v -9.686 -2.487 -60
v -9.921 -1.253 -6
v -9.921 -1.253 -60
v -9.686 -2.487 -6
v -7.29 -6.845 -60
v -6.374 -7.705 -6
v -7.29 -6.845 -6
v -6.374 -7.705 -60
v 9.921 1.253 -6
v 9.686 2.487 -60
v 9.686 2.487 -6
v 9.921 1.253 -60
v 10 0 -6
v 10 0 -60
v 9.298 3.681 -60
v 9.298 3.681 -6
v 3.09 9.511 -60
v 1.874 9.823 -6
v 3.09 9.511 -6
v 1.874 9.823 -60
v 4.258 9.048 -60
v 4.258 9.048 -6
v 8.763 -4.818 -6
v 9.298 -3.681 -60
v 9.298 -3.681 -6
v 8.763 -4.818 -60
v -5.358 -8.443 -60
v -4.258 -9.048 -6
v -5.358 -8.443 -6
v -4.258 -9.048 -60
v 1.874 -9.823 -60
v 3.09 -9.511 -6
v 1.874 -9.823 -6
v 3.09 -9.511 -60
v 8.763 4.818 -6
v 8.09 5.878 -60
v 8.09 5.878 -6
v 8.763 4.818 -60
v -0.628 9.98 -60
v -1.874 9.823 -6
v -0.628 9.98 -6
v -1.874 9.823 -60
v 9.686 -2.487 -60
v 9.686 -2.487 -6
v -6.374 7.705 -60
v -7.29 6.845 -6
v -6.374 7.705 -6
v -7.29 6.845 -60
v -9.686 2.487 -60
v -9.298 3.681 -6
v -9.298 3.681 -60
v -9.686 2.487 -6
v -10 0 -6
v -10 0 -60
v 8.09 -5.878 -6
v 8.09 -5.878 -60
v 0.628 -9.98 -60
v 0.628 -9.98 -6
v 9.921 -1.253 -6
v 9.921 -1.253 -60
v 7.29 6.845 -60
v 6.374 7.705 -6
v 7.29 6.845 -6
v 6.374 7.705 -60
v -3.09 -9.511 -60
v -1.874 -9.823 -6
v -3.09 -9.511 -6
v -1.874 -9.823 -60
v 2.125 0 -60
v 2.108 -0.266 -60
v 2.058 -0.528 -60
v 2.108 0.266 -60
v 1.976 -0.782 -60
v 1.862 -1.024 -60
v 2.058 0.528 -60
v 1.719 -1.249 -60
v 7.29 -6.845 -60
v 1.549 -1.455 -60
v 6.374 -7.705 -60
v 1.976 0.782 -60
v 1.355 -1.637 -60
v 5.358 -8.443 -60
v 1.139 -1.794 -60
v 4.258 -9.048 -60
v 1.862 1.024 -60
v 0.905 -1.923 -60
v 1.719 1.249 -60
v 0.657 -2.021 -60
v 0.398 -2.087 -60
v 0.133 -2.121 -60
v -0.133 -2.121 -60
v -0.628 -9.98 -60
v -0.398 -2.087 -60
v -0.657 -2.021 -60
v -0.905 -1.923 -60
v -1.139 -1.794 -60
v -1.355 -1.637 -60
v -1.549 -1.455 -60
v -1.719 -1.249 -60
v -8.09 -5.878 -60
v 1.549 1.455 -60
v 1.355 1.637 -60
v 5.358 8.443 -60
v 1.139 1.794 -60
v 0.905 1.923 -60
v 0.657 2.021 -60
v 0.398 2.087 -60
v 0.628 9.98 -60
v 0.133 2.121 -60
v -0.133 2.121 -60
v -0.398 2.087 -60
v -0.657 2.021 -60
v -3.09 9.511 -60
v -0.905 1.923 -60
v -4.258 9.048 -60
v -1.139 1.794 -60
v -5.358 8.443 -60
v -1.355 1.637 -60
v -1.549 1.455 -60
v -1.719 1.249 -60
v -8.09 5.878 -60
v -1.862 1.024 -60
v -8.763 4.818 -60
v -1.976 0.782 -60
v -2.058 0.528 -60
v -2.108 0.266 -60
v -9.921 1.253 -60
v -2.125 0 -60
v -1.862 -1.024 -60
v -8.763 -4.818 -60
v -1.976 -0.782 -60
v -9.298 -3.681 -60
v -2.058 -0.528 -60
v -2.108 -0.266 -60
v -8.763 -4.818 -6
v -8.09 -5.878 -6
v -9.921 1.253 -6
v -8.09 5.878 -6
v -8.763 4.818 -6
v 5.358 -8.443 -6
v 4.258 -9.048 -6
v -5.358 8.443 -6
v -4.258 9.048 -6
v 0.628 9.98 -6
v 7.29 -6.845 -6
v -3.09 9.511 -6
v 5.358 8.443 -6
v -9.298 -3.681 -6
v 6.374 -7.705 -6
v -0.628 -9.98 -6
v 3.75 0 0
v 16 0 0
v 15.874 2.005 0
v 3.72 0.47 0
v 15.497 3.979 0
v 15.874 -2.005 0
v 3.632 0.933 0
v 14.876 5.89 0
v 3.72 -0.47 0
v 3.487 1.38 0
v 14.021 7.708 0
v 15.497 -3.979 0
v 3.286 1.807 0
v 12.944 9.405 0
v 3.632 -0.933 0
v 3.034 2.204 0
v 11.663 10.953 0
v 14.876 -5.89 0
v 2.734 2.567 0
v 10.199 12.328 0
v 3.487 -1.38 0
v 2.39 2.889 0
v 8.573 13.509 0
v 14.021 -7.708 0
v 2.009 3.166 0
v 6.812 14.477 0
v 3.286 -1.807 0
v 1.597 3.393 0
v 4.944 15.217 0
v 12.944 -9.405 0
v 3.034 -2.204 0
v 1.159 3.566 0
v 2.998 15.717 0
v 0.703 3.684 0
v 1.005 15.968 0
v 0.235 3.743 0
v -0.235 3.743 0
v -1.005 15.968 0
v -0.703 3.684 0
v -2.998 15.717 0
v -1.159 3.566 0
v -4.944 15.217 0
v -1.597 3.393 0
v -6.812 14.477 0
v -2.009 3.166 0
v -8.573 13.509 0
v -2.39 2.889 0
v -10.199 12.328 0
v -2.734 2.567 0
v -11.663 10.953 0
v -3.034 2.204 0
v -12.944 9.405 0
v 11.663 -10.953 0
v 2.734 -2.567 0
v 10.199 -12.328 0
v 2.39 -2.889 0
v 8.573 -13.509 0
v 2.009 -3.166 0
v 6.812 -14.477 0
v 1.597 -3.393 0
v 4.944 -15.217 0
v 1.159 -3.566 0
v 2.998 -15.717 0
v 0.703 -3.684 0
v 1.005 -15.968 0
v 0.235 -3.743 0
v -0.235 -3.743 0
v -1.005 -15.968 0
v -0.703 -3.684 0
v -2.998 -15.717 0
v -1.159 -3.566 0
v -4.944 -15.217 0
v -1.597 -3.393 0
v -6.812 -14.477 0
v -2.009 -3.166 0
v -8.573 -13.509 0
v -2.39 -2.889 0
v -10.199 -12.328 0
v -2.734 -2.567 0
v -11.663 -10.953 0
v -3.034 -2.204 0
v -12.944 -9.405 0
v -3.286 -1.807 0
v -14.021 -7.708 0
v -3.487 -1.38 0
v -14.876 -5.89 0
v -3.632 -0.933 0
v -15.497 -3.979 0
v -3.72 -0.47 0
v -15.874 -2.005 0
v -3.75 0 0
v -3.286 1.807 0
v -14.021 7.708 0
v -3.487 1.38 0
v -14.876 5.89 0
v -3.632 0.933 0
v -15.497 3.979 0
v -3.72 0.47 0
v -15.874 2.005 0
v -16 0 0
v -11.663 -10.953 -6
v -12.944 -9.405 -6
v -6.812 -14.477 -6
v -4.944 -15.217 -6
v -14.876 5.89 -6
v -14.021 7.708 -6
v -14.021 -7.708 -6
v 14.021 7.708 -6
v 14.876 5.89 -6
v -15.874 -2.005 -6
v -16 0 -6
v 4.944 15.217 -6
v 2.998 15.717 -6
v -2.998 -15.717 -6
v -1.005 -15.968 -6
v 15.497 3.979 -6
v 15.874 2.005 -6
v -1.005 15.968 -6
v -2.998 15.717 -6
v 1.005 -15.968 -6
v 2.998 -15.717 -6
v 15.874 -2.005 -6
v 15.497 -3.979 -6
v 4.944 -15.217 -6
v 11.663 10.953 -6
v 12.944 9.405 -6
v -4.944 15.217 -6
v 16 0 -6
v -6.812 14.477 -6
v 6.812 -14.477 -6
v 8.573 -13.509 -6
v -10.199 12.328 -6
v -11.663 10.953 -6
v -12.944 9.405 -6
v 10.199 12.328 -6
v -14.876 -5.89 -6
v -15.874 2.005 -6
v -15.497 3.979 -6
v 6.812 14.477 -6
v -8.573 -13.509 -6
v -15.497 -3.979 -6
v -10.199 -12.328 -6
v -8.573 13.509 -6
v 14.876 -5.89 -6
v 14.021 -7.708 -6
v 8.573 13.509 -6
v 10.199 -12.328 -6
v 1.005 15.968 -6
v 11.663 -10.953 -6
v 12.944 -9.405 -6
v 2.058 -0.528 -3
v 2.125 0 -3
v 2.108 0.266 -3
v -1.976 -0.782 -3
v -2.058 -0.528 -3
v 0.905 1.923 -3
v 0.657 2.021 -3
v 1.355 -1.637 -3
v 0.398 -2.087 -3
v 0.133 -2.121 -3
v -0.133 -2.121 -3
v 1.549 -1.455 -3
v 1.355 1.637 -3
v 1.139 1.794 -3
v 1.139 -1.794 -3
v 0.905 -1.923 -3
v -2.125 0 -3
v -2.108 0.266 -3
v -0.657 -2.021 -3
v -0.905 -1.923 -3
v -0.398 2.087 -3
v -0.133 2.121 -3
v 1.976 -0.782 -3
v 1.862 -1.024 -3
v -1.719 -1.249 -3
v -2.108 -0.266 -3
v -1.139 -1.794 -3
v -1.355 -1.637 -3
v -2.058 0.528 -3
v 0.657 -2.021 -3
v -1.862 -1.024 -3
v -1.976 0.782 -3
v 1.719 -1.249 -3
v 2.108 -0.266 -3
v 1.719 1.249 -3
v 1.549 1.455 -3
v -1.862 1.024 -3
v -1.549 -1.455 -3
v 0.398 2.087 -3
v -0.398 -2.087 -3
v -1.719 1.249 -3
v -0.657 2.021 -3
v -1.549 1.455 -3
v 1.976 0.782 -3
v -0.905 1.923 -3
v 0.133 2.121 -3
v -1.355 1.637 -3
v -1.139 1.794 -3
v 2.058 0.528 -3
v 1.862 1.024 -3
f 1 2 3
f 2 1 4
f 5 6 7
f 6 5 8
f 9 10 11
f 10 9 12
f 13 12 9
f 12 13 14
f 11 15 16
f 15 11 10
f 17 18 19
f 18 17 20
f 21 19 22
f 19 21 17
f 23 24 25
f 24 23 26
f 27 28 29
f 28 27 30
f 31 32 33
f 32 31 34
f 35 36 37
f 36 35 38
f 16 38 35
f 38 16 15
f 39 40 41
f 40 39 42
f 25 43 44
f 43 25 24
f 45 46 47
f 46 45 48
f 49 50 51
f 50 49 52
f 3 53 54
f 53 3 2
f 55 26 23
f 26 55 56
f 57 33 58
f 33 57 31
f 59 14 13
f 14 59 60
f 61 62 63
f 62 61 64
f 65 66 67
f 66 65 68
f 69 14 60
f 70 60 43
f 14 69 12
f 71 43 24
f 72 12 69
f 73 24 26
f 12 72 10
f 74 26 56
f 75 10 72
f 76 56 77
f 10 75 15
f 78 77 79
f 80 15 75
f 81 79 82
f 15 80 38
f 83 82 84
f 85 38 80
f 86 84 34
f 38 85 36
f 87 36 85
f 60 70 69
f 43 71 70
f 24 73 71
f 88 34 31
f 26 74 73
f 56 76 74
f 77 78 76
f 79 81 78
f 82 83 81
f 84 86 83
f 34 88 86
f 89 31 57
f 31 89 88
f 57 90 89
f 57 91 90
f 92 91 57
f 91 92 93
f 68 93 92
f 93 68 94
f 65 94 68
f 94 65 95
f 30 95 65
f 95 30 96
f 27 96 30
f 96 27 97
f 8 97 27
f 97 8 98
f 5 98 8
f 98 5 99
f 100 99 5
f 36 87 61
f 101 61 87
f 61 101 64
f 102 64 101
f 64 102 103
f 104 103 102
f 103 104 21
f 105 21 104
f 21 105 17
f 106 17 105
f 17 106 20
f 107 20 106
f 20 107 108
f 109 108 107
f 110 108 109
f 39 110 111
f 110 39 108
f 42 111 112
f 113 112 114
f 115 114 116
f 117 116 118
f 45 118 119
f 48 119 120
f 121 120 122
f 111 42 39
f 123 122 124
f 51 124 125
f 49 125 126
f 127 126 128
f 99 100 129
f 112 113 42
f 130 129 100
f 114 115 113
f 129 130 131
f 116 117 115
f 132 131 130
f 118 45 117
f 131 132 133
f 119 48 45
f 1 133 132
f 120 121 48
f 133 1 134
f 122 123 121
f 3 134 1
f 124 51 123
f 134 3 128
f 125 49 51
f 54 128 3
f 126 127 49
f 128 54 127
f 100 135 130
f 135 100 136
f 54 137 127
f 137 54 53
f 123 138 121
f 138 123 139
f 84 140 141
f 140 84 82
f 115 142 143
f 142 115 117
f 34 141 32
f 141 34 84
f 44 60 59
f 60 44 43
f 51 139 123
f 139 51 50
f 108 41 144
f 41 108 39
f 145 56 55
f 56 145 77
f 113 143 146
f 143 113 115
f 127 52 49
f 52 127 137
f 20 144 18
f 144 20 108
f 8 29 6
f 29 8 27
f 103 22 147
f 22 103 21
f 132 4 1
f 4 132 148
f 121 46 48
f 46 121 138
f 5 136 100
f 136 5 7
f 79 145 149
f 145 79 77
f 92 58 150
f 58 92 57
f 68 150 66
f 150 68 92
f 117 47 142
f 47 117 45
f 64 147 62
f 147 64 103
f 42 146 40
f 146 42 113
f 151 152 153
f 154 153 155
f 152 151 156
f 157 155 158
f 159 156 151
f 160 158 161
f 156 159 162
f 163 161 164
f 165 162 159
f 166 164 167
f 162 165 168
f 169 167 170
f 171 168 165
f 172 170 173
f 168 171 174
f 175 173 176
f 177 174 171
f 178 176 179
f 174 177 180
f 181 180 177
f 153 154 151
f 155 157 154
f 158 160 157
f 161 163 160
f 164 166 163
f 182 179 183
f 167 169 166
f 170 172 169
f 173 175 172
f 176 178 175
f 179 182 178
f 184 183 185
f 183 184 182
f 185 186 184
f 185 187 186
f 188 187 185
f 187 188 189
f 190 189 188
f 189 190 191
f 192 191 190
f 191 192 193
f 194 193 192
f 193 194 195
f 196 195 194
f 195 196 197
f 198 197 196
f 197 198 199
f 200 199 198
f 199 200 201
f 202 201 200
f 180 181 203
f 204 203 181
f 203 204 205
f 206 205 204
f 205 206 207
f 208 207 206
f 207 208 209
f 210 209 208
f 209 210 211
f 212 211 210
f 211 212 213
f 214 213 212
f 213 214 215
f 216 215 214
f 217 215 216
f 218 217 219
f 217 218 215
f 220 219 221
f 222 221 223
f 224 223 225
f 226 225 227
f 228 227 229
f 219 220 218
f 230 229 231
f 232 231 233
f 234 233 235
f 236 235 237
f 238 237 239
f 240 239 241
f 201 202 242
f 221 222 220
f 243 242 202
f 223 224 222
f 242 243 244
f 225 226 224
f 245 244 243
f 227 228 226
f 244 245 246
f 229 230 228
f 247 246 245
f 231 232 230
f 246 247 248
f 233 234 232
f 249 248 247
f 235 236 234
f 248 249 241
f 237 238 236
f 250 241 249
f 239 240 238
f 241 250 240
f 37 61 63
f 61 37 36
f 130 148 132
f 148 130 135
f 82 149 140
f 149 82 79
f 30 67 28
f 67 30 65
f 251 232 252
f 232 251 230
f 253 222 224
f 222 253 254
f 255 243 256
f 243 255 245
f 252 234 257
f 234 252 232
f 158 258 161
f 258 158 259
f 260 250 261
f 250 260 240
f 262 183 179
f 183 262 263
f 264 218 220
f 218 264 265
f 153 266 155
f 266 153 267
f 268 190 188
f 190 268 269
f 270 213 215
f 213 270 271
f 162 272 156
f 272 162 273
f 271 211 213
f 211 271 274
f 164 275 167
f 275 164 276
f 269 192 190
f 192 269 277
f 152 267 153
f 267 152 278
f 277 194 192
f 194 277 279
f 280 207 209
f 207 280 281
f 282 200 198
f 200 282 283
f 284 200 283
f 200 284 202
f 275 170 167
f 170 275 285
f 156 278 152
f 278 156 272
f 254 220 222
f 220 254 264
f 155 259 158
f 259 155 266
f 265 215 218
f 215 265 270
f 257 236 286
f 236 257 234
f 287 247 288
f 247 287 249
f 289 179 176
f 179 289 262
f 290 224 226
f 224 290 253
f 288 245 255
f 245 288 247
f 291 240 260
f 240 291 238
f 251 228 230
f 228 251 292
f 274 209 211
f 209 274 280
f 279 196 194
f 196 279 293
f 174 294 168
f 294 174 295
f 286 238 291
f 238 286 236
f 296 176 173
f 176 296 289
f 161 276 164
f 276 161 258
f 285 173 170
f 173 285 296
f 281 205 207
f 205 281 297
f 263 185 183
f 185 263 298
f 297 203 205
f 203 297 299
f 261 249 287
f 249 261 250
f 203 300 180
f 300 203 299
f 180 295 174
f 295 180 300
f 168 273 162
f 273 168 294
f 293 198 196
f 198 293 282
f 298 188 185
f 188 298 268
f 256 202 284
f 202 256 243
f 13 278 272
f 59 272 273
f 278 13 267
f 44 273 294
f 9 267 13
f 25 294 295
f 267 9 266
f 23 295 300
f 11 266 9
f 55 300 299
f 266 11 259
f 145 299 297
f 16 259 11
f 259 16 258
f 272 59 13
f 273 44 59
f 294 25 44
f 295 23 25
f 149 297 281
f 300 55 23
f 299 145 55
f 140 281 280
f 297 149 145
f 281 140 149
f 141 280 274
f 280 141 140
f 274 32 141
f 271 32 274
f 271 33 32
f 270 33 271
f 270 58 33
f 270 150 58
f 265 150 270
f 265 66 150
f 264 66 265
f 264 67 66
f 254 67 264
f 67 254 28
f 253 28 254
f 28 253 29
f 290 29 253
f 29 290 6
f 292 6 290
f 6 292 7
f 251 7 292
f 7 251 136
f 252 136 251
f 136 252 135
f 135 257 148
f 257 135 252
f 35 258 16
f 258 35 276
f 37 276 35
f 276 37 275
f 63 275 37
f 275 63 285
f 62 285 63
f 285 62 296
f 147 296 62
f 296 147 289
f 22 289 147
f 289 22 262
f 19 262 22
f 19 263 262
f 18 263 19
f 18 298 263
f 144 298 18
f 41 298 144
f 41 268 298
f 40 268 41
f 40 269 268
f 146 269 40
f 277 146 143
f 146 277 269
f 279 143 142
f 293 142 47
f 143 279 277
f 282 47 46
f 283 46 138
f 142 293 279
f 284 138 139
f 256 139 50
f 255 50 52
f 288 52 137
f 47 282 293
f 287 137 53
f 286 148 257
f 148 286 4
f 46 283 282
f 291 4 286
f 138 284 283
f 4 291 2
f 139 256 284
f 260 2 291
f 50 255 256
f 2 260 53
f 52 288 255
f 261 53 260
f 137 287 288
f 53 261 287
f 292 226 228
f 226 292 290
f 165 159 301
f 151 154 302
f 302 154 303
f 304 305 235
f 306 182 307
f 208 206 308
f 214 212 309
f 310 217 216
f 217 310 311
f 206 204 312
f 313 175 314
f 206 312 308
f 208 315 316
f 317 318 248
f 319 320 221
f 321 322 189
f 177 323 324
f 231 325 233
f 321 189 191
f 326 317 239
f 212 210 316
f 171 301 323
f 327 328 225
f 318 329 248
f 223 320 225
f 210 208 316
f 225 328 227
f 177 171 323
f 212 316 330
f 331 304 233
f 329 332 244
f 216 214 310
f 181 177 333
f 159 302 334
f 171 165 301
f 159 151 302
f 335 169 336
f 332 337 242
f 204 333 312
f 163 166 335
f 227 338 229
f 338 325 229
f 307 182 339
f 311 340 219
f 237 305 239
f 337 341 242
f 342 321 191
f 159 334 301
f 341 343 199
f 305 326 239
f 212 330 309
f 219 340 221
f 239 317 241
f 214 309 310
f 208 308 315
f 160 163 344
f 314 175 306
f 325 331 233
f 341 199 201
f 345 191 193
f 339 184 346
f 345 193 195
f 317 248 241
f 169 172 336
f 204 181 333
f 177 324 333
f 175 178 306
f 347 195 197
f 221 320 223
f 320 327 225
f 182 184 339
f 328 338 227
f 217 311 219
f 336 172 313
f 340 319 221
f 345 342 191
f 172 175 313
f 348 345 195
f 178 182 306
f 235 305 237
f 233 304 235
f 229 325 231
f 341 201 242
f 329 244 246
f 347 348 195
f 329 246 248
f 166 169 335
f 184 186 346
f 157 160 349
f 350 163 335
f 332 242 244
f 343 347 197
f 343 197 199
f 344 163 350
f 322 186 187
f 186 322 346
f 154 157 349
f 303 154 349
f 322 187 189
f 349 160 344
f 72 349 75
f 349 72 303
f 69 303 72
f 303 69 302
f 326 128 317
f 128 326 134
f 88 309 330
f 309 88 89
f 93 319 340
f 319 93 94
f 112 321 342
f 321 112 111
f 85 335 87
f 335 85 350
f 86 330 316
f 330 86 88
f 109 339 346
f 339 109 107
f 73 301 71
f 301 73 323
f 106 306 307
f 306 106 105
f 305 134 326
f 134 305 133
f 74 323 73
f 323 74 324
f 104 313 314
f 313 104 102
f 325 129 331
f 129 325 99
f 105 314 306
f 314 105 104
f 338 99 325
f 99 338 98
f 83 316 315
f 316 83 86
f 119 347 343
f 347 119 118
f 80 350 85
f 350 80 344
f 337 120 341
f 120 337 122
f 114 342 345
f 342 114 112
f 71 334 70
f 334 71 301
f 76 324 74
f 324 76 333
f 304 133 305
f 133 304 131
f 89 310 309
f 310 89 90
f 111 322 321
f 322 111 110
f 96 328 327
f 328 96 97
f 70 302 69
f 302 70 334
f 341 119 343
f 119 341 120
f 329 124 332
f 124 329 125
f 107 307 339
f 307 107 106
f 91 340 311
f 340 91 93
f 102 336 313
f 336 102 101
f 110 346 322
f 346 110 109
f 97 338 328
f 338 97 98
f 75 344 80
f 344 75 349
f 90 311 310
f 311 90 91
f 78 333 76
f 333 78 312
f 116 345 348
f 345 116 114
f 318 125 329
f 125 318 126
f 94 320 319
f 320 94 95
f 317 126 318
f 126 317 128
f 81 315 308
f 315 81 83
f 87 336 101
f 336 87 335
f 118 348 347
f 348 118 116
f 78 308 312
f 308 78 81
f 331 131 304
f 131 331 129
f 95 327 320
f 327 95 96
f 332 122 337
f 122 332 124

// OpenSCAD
$fn = 50;


difference() {
	union() {
		translate(v = [0, 0, -60.0000000000]) {
			cylinder(h = 60, r = 10.0000000000);
		}
		translate(v = [0, 0, -6.0000000000]) {
			cylinder(h = 6, r = 16.0000000000);
		}
	}
	union() {
		translate(v = [0, 0, 0]) {
			rotate(a = [0, 0, 0]) {
				difference() {
					union() {
						#translate(v = [0, 0, -60.0000000000]) {
							cylinder(h = 60, r = 2.0000000000);
						}
						#translate(v = [0, 0, -3]) {
							cylinder(h = 3, r = 10.0000000000, r1 = 2.1250000000, r2 = 3.7500000000);
						}
						#translate(v = [0, 0, -60.0000000000]) {
							cylinder(h = 60, r = 2.1250000000);
						}
						#translate(v = [0, 0, -60.0000000000]) {
							cylinder(h = 60, r = 2.0000000000);
						}
					}
					union();
				}
			}
		}
	}
}
